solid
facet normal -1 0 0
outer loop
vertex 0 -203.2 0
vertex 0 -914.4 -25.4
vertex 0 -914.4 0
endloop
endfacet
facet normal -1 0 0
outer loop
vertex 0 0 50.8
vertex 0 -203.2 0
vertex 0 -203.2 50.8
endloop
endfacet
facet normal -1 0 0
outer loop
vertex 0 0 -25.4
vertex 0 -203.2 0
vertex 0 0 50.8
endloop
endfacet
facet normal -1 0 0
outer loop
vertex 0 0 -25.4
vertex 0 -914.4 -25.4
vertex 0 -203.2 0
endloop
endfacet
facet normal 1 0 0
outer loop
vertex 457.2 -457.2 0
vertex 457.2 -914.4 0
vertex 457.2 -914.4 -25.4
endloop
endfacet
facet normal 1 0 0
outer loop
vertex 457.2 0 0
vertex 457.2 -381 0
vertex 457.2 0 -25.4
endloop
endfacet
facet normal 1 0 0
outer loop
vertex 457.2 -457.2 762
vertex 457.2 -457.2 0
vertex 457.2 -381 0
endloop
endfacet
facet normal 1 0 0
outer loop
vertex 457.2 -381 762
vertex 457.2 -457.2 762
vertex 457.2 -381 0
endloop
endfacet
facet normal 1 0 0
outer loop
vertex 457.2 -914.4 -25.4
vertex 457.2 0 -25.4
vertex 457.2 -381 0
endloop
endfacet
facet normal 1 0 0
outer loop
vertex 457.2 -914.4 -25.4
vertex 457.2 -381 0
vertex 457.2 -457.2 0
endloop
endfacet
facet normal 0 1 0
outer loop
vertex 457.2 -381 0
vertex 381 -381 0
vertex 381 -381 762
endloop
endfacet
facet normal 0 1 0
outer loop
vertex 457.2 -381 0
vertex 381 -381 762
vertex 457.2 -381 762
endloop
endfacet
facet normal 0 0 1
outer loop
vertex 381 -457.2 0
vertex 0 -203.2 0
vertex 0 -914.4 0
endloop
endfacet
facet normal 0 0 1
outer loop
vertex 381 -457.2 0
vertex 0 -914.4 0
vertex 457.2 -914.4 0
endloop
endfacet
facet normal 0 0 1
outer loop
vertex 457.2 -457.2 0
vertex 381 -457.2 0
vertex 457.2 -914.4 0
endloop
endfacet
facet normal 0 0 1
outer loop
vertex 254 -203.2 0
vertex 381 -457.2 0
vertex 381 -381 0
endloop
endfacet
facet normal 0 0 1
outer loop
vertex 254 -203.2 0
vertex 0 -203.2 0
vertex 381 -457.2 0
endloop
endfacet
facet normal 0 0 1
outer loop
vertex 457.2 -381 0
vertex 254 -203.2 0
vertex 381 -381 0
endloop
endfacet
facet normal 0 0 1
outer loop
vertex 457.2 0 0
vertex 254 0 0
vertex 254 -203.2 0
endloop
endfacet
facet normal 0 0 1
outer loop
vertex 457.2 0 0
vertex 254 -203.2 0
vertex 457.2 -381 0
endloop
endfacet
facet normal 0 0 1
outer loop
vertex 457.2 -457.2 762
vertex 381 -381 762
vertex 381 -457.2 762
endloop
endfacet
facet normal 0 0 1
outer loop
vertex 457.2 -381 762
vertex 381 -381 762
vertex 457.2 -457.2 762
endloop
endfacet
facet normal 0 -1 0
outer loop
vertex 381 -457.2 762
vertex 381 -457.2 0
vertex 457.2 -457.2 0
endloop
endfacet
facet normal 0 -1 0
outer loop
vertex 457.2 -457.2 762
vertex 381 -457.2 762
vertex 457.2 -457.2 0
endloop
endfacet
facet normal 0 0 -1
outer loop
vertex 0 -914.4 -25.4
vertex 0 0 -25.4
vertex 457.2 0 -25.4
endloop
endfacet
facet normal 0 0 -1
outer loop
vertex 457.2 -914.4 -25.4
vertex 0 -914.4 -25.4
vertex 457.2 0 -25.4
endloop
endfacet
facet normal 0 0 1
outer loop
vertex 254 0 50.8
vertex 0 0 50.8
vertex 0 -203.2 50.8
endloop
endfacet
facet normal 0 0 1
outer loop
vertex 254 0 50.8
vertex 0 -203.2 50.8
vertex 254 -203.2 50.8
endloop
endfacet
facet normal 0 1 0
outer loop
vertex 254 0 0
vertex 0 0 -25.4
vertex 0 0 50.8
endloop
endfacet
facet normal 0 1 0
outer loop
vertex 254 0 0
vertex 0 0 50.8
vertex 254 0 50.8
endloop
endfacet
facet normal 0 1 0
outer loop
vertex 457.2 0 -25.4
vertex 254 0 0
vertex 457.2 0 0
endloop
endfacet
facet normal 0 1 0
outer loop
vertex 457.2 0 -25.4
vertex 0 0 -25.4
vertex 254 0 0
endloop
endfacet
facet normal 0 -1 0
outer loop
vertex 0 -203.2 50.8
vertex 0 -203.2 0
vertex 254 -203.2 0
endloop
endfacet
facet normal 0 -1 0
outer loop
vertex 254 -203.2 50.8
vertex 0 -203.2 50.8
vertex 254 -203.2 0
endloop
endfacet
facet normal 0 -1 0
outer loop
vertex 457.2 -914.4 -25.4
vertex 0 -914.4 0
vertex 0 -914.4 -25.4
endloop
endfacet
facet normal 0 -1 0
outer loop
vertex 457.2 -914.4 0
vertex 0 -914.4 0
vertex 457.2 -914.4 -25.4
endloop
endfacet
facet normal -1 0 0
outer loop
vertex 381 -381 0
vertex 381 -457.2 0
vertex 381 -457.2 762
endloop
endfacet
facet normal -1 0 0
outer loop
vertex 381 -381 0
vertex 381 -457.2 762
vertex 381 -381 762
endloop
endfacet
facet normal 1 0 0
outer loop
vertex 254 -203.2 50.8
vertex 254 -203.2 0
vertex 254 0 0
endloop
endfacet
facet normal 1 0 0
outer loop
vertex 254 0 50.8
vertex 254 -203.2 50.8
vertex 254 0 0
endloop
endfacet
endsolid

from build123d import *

# Parameters (mm, degrees)
F0_W     = 254
F0_H     = 203.2
F0_W_2   = 76.2
F0_H_2   = 76.2
F1_DEPTH = 25.4
F2_DEPTH = 50.8
F3_DEPTH = 762


with BuildPart() as f1:
    # F0 (on Top) → F1 (new body)
    with BuildSketch(Plane.XY):
        with Locations((127, -101.6)):
            Rectangle(F0_W, F0_H)
        Polygon((457.2, 0), (254, 0), (254, -203.2), (0, -203.2), (0, -914.4), (457.2, -914.4), (457.2, -457.2), (381, -457.2), (381, -381), (457.2, -381), align=None)
        with Locations((419.1, -419.1)):
            Rectangle(F0_W_2, F0_H_2)
    extrude(amount=-F1_DEPTH)

    # F0 (on Top) → F2 (join)
    with BuildSketch(Plane.XY):
        with Locations((127, -101.6)):
            Rectangle(F0_W, F0_H)
    extrude(amount=F2_DEPTH)

    # F0 (on Top) → F3 (join)
    with BuildSketch(Plane.XY):
        with Locations((419.1, -419.1)):
            Rectangle(F0_W_2, F0_H_2)
    extrude(amount=F3_DEPTH)


solid = f1.part
